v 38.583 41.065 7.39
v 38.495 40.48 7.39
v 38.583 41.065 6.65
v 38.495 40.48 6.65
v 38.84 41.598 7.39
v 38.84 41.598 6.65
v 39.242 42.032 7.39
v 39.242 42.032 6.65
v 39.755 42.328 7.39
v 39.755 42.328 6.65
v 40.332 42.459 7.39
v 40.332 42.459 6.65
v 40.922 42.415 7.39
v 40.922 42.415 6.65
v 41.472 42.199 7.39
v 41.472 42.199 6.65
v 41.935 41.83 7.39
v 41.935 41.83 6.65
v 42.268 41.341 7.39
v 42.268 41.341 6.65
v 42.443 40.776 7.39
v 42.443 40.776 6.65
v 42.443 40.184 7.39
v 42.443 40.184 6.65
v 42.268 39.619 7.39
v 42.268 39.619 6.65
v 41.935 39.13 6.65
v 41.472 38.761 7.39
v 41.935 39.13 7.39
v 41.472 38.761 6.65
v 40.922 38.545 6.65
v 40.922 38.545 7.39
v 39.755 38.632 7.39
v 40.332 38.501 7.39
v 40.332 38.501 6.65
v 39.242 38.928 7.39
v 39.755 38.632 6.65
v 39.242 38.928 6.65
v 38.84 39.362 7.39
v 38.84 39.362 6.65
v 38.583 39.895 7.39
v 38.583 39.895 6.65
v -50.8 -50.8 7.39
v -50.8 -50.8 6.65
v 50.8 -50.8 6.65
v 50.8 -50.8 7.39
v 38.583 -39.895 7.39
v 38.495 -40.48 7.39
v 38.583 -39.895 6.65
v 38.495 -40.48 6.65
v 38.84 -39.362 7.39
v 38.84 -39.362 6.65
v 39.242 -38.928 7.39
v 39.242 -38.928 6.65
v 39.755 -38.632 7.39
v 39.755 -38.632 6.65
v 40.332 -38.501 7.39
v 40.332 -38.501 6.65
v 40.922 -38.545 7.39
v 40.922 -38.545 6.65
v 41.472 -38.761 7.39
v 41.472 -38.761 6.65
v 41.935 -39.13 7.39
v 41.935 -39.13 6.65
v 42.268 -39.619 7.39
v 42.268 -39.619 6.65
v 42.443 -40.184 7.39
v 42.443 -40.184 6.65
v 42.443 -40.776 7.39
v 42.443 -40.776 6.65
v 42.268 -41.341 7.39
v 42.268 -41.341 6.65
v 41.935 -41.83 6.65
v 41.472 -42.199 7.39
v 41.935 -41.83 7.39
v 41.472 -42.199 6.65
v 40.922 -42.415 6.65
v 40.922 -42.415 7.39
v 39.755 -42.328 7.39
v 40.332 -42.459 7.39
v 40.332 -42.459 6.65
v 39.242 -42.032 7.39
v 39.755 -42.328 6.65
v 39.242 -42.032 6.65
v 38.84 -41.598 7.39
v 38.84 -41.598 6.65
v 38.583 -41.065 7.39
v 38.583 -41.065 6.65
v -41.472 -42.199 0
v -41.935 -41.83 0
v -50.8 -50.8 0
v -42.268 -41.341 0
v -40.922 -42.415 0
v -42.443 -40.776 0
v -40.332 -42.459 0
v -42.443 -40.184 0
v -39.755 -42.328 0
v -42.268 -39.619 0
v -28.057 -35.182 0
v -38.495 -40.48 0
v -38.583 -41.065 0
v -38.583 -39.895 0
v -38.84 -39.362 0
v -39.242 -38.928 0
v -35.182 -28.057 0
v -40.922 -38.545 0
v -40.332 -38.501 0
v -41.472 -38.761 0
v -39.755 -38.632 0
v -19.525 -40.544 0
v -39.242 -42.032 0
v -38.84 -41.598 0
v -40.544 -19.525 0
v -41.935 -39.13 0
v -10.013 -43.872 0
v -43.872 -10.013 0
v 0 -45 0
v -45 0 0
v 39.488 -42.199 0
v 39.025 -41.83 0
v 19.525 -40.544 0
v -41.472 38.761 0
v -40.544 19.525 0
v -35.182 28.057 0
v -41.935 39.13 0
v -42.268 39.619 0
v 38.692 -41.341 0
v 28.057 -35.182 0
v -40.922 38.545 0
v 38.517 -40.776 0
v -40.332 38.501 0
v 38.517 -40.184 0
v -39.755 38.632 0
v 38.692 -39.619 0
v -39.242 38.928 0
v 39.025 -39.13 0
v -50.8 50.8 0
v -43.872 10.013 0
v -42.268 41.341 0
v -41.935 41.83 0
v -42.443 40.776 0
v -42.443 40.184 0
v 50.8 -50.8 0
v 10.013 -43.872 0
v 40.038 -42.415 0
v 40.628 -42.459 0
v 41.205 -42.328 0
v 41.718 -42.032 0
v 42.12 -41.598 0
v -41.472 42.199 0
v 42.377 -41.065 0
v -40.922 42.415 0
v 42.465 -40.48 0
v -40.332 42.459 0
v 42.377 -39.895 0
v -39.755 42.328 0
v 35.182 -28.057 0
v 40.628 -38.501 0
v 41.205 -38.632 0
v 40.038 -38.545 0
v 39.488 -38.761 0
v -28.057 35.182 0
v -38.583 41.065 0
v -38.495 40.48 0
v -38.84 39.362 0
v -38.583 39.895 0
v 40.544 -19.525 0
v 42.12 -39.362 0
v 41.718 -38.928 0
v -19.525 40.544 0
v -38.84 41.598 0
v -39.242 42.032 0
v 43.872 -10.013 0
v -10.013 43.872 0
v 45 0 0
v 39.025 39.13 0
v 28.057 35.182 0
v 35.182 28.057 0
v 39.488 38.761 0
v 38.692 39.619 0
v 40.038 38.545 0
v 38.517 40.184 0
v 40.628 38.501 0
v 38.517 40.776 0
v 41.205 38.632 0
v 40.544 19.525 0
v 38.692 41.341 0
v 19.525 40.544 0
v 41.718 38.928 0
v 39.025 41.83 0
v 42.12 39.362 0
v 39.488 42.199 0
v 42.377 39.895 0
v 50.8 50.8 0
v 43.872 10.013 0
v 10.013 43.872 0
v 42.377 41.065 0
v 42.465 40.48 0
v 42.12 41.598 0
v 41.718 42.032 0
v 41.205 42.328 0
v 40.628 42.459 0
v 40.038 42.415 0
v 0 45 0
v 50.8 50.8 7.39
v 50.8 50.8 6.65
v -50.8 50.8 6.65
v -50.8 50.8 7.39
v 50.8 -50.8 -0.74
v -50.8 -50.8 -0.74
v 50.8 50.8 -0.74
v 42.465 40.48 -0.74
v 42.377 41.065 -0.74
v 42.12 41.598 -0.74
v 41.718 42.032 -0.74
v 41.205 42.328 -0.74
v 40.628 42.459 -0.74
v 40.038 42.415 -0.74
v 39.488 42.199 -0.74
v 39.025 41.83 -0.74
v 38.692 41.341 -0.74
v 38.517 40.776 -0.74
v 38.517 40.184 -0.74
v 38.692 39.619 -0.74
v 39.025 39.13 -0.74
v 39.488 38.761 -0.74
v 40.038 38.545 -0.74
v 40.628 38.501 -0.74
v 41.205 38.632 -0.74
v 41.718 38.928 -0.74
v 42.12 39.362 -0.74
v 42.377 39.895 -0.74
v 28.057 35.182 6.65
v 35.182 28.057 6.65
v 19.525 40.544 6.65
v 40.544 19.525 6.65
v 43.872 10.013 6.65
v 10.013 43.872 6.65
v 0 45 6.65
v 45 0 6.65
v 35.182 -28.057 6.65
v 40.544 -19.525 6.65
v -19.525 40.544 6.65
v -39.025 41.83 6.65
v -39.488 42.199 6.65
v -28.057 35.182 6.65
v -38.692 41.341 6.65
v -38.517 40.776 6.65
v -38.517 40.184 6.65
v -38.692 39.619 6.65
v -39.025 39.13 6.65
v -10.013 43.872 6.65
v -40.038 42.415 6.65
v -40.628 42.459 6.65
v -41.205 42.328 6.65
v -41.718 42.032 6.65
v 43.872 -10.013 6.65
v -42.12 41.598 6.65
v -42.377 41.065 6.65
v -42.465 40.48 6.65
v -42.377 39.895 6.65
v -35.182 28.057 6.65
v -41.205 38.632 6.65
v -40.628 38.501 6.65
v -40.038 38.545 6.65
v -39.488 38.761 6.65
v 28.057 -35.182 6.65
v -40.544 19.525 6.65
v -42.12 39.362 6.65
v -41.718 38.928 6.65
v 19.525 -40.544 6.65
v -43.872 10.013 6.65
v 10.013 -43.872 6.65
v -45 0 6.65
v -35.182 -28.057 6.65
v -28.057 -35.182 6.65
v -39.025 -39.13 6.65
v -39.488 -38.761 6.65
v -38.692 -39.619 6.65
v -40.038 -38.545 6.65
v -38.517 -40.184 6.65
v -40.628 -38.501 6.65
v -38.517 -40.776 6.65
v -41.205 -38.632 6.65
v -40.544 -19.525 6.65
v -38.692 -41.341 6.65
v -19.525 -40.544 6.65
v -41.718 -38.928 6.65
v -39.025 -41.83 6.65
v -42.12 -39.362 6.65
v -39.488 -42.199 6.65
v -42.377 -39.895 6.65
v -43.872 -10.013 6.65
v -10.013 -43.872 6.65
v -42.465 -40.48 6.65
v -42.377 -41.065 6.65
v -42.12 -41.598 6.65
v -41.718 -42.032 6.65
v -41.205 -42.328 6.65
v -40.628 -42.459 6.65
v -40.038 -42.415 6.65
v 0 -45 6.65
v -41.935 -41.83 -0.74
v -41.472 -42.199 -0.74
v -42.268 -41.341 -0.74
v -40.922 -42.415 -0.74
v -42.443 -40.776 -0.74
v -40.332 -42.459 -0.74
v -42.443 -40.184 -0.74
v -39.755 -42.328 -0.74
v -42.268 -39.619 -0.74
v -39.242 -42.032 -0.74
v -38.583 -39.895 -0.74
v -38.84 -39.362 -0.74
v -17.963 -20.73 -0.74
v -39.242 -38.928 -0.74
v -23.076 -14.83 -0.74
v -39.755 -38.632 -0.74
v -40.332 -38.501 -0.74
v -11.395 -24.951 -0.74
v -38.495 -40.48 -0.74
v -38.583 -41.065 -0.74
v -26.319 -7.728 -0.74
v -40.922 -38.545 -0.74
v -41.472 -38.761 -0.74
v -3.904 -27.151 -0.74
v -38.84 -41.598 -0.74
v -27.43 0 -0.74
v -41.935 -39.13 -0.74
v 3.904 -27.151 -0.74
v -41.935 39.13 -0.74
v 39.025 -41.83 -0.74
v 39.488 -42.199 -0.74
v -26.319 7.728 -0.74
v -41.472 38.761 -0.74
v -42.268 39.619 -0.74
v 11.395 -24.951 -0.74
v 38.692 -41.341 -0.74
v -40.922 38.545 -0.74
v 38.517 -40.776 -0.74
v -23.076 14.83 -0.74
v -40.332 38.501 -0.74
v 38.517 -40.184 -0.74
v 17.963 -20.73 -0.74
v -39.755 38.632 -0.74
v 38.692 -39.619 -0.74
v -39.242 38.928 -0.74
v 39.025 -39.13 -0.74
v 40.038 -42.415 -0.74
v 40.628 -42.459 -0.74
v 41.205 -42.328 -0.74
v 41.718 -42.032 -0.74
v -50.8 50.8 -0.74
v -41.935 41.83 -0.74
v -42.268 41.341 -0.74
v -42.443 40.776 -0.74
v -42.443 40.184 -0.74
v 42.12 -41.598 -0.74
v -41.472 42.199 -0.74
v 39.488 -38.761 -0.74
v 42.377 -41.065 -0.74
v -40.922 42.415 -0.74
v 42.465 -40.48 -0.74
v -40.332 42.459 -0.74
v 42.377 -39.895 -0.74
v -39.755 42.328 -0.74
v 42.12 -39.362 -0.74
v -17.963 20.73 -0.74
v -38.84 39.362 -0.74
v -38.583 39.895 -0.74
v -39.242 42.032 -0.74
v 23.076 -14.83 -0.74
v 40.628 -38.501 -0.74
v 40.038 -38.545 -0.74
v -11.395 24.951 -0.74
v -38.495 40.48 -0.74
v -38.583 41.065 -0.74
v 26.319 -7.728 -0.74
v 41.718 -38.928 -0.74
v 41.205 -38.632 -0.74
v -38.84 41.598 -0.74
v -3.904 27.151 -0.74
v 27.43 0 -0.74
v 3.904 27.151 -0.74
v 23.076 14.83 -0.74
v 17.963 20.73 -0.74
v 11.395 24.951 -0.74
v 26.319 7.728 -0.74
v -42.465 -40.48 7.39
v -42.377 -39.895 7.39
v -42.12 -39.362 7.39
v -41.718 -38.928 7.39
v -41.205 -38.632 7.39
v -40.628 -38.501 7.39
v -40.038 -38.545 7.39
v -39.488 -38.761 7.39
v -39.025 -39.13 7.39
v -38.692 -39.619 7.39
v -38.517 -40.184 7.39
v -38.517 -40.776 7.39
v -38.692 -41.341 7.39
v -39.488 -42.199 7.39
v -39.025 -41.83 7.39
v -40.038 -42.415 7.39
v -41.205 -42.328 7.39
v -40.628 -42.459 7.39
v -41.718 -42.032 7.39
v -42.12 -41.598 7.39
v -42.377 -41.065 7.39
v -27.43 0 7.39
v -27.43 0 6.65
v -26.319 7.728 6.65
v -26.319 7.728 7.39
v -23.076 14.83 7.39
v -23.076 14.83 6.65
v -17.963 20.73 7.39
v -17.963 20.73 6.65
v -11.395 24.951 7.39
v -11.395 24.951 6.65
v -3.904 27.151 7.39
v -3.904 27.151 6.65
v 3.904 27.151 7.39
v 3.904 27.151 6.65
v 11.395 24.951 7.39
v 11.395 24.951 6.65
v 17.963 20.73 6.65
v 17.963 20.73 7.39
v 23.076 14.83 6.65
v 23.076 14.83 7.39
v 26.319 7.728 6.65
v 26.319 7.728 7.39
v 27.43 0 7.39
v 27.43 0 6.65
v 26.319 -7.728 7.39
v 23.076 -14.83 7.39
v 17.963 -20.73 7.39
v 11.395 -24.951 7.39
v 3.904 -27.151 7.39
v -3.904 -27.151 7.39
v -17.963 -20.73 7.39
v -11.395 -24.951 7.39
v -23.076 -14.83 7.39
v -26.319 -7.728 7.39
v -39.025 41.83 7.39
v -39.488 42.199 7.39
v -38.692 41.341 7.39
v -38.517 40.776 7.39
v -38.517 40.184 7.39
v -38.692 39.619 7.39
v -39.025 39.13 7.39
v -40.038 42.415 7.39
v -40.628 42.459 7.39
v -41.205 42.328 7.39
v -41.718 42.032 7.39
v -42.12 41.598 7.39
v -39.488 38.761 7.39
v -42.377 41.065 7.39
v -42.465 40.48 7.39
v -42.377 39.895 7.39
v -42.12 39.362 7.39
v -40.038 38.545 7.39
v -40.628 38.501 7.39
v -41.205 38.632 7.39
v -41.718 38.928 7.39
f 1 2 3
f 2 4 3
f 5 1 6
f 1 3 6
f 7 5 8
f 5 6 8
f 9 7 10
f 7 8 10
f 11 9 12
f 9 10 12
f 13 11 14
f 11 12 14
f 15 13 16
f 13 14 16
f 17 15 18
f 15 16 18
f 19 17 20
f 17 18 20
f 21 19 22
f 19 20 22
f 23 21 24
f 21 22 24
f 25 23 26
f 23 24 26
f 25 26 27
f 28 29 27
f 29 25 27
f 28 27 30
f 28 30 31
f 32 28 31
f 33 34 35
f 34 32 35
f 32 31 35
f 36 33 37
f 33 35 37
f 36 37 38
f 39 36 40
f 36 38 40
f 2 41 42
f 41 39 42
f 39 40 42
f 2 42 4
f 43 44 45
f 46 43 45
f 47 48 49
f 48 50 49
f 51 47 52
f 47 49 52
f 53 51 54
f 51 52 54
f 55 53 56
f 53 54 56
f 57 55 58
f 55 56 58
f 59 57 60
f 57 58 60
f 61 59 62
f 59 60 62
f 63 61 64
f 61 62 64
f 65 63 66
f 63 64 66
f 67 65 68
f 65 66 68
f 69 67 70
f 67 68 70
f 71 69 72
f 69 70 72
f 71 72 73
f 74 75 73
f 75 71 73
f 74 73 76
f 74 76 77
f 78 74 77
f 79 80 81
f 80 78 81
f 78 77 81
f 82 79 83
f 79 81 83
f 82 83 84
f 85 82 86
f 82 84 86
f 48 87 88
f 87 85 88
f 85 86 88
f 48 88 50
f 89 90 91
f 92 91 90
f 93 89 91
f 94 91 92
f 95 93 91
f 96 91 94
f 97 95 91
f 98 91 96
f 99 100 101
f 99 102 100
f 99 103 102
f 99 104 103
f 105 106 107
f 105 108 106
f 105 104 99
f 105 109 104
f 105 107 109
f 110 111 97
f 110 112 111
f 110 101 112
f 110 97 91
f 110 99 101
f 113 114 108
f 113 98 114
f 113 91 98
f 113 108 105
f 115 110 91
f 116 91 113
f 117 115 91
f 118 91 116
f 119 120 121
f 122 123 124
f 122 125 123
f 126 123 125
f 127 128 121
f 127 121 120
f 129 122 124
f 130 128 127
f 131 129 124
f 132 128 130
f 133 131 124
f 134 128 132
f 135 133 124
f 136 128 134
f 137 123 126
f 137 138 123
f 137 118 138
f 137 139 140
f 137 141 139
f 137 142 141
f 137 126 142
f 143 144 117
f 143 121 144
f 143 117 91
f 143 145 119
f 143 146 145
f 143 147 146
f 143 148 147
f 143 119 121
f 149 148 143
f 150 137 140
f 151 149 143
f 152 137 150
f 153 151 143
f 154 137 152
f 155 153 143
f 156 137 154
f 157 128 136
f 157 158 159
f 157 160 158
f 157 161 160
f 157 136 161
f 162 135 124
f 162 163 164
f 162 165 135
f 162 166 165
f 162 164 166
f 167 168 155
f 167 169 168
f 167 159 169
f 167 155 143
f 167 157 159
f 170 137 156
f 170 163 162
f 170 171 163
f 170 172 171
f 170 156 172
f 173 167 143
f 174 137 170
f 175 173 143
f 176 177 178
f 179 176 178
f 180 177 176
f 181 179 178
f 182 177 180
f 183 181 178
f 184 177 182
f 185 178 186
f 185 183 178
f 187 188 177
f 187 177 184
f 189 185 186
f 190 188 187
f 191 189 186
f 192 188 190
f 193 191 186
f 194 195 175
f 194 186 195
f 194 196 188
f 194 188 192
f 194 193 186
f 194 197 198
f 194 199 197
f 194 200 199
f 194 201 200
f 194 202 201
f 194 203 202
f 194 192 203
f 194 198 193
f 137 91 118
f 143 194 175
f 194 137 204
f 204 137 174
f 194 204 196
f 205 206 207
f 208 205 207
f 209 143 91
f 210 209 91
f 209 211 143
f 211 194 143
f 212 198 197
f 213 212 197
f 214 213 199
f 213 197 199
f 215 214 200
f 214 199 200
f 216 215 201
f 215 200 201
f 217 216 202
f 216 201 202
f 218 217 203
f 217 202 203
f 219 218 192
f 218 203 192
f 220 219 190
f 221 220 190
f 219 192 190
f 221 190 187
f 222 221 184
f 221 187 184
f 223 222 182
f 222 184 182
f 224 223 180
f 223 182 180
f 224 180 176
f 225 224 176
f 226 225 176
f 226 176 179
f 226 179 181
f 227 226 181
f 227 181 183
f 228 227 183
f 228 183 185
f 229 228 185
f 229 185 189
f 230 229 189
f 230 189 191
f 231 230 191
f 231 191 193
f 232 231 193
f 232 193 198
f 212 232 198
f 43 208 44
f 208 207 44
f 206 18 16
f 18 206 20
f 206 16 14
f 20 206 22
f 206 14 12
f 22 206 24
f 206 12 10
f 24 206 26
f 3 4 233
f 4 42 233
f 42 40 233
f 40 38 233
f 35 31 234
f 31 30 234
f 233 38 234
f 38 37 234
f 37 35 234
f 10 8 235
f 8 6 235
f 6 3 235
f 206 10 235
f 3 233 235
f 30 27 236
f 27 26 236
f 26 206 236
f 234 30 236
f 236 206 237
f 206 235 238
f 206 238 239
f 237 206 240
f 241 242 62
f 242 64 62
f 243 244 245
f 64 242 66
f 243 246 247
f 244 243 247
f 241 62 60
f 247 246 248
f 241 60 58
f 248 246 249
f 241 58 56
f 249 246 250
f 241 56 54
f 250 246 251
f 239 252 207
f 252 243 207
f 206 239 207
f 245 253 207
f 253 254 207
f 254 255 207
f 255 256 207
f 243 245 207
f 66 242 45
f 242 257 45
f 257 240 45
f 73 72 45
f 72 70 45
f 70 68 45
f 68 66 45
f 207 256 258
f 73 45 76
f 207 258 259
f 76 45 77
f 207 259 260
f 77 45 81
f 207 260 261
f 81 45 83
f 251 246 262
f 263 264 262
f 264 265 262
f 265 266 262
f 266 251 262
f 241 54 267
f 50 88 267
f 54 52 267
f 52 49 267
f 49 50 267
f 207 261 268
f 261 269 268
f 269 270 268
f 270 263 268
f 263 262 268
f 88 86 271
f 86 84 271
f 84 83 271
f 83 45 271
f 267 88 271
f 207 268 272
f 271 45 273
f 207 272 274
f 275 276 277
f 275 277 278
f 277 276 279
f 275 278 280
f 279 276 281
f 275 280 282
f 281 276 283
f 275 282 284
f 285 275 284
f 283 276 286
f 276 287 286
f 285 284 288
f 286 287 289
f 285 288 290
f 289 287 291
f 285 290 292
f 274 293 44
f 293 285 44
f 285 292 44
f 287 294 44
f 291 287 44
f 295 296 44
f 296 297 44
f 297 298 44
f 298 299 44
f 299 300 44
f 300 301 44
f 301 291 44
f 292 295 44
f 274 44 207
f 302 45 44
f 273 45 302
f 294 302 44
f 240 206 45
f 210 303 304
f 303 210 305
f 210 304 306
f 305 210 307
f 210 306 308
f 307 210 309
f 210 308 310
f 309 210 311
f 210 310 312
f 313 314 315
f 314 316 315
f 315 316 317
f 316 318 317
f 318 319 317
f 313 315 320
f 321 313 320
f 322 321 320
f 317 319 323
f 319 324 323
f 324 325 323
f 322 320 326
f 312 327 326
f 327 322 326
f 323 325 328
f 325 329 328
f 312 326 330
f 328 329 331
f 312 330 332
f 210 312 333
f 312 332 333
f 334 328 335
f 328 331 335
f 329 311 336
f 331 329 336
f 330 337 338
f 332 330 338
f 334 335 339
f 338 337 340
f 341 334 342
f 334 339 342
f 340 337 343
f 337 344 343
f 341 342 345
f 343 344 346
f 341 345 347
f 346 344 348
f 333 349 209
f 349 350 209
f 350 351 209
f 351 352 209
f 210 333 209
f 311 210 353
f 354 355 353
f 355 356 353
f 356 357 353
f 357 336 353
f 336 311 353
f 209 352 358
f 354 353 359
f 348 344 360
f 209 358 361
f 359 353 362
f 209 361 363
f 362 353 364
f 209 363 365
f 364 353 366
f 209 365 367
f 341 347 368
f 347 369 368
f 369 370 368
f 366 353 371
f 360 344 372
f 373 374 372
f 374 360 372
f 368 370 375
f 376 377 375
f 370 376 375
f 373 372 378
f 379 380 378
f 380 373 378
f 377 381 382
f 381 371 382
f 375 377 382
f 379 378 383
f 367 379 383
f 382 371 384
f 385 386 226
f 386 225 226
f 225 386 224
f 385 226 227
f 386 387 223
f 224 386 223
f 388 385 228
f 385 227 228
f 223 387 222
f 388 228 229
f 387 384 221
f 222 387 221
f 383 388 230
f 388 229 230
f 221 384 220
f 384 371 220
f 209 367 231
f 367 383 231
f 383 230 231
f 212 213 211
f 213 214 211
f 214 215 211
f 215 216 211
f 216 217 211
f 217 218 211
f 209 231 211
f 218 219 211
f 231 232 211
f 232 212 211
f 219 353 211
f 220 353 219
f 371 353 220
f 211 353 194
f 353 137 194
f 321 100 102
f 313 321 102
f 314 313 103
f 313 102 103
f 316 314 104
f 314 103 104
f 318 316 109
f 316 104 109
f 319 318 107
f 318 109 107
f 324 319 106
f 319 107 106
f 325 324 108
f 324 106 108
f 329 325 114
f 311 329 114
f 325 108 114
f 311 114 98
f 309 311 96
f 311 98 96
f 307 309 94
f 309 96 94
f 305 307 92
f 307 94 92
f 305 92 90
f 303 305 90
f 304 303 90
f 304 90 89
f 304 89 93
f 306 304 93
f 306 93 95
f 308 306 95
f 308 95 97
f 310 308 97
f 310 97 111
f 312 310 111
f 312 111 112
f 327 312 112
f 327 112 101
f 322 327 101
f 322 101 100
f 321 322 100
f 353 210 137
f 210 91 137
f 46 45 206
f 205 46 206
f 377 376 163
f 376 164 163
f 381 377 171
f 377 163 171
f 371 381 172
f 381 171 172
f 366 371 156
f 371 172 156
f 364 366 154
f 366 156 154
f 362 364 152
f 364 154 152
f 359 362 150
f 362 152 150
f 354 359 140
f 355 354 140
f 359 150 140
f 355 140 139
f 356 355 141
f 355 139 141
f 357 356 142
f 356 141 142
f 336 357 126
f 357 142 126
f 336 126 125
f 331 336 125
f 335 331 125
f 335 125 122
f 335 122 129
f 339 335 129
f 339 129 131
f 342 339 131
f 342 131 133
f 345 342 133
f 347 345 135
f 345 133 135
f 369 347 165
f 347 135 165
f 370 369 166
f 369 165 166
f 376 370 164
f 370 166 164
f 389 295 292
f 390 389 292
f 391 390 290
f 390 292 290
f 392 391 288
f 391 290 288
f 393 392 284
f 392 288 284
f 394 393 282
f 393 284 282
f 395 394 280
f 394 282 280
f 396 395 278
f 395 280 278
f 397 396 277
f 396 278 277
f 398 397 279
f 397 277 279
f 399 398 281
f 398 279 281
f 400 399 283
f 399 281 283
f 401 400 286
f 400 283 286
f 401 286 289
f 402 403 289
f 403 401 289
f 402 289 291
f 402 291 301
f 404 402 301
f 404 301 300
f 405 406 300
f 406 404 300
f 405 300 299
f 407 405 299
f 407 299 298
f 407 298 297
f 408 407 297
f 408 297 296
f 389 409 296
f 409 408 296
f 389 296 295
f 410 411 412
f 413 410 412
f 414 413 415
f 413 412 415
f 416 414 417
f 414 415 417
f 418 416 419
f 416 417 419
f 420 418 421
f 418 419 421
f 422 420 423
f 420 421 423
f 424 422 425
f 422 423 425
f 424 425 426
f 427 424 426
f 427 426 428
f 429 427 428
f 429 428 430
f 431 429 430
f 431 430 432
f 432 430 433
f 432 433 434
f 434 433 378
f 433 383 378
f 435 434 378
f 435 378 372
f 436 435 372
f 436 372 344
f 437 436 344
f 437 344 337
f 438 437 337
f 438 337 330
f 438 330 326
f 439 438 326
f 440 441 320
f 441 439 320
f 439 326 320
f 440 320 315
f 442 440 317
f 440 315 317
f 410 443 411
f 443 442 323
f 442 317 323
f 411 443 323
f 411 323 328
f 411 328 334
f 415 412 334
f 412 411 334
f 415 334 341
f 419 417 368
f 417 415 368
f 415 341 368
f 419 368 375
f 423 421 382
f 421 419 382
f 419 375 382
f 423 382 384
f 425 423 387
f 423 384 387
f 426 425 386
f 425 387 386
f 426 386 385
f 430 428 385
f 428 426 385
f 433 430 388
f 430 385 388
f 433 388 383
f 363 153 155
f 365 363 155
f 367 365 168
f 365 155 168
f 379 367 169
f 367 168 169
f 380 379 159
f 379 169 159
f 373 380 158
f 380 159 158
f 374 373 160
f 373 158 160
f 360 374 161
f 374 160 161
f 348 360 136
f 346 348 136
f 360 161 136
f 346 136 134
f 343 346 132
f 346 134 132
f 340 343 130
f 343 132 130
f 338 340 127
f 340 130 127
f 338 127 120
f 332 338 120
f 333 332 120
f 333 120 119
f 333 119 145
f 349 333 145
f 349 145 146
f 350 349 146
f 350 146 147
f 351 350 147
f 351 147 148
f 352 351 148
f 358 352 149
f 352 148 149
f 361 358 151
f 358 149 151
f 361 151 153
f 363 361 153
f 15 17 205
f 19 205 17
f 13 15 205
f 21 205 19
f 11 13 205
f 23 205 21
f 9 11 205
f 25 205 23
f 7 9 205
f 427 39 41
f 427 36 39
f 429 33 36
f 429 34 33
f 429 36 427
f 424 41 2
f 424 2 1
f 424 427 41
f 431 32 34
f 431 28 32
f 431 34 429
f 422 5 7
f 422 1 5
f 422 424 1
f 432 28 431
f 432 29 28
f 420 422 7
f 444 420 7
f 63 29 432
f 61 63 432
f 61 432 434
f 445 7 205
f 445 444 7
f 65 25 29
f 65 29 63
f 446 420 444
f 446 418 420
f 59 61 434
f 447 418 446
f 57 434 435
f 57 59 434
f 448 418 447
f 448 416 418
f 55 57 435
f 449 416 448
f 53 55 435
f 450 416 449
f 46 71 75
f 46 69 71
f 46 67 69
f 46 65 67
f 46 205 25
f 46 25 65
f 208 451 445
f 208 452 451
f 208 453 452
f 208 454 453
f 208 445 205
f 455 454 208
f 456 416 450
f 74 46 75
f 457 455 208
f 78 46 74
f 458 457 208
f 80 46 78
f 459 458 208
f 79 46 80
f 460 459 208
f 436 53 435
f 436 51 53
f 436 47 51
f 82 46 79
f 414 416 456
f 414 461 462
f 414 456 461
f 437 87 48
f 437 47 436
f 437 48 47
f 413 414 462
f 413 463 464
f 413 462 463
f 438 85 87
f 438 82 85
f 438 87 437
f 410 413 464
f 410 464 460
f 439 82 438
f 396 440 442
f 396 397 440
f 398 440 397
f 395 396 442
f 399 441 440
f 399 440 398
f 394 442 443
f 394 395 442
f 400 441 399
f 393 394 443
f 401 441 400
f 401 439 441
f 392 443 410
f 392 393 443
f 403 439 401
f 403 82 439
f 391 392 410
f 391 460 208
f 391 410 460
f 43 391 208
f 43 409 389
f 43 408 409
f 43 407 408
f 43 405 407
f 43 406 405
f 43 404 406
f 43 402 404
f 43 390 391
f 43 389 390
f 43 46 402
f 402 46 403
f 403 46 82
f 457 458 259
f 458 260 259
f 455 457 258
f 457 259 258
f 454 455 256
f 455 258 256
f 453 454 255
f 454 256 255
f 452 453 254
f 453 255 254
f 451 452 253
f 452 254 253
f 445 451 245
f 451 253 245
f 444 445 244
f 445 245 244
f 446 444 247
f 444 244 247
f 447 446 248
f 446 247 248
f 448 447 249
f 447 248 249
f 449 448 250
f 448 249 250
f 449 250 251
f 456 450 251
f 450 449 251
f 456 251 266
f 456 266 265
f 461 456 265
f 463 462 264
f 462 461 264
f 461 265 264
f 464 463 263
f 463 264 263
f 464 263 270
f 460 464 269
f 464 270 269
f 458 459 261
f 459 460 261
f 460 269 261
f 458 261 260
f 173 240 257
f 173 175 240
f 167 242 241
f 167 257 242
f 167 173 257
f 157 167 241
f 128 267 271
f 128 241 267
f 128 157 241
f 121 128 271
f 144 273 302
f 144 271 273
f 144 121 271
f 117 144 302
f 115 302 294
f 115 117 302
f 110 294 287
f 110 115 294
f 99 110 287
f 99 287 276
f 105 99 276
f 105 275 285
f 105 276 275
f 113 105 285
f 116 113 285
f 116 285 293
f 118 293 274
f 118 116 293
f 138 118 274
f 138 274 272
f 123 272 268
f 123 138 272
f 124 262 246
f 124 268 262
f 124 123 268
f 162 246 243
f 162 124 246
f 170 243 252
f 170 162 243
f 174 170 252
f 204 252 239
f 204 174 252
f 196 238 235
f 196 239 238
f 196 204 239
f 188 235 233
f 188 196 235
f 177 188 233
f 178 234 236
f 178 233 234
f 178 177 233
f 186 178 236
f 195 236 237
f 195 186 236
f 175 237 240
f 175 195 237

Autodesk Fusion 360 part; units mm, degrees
sketch "Sketch1" plane through (0, 0, 0) normal (0, 0, 1) x (1, 0, 0)
  line L0 (-50.8, 50.8) -> (50.8, 50.8)
  line L1 (50.8, 50.8) -> (50.8, -50.8)
  line L2 (50.8, -50.8) -> (-50.8, -50.8)
  line L3 (-50.8, -50.8) -> (-50.8, 50.8)
  line L4 (-50.8, 50.8) -> (50.8, -50.8) construction
  line L5 (50.8, 50.8) -> (-50.8, -50.8) construction
  circle A0 centre (0, 0) radius 27.43
  line L6 (0, 0) -> (-40.48, 0) construction
  line L7 (-40.48, 0) -> (-40.48, -40.48) construction
  line L8 (-40.48, -40.48) -> (0, -40.48) construction
  line L9 (0, -40.48) -> (0, 0) construction
  circle A1 centre (-40.48, -40.48) radius 1.985
  circle A2 centre (-40.48, 40.48) radius 1.985
  circle A3 centre (40.48, 40.48) radius 1.985
  circle A4 centre (40.48, -40.48) radius 1.985
  circle A5 centre (0, 0) radius 45
  dimension "d1" = 101.6
  dimension "d2" = 101.6
  dimension "d3" = 54.86
  dimension "d4" = 40.48
  dimension "d5" = 40.48
  dimension "d6" = 3.97
extrude "Extrude1" add sketch "Sketch1" against normal blind 0.74 contours L0 L1 L2 L3 | A5
extrude "Extrude2" add sketch "Sketch1" along normal blind 6.65 contours A5
sketch "Sketch2" plane through (0, 0, 6.65) normal (0, 0, 1) x (-1, 0, 0)
  circle A0 centre (0, 0) radius 27.43
  circle A1 centre (0, 0) radius 45
  circle A2 centre (0, 0) radius 45
  circle A3 centre (-40.48, 40.48) radius 1.985
  circle A4 centre (40.48, 40.48) radius 1.985
  circle A5 centre (40.48, -40.48) radius 1.985
  circle A6 centre (-40.48, -40.48) radius 1.985
  line L0 (50.8, 50.8) -> (-50.8, 50.8)
  line L1 (-50.8, 50.8) -> (-50.8, -50.8)
  line L2 (-50.8, -50.8) -> (50.8, -50.8)
  line L3 (50.8, -50.8) -> (50.8, 50.8)
extrude "Extrude3" add sketch "Sketch2" along normal blind 0.74 contours A1 A2 | L0 L1 L2 L3
